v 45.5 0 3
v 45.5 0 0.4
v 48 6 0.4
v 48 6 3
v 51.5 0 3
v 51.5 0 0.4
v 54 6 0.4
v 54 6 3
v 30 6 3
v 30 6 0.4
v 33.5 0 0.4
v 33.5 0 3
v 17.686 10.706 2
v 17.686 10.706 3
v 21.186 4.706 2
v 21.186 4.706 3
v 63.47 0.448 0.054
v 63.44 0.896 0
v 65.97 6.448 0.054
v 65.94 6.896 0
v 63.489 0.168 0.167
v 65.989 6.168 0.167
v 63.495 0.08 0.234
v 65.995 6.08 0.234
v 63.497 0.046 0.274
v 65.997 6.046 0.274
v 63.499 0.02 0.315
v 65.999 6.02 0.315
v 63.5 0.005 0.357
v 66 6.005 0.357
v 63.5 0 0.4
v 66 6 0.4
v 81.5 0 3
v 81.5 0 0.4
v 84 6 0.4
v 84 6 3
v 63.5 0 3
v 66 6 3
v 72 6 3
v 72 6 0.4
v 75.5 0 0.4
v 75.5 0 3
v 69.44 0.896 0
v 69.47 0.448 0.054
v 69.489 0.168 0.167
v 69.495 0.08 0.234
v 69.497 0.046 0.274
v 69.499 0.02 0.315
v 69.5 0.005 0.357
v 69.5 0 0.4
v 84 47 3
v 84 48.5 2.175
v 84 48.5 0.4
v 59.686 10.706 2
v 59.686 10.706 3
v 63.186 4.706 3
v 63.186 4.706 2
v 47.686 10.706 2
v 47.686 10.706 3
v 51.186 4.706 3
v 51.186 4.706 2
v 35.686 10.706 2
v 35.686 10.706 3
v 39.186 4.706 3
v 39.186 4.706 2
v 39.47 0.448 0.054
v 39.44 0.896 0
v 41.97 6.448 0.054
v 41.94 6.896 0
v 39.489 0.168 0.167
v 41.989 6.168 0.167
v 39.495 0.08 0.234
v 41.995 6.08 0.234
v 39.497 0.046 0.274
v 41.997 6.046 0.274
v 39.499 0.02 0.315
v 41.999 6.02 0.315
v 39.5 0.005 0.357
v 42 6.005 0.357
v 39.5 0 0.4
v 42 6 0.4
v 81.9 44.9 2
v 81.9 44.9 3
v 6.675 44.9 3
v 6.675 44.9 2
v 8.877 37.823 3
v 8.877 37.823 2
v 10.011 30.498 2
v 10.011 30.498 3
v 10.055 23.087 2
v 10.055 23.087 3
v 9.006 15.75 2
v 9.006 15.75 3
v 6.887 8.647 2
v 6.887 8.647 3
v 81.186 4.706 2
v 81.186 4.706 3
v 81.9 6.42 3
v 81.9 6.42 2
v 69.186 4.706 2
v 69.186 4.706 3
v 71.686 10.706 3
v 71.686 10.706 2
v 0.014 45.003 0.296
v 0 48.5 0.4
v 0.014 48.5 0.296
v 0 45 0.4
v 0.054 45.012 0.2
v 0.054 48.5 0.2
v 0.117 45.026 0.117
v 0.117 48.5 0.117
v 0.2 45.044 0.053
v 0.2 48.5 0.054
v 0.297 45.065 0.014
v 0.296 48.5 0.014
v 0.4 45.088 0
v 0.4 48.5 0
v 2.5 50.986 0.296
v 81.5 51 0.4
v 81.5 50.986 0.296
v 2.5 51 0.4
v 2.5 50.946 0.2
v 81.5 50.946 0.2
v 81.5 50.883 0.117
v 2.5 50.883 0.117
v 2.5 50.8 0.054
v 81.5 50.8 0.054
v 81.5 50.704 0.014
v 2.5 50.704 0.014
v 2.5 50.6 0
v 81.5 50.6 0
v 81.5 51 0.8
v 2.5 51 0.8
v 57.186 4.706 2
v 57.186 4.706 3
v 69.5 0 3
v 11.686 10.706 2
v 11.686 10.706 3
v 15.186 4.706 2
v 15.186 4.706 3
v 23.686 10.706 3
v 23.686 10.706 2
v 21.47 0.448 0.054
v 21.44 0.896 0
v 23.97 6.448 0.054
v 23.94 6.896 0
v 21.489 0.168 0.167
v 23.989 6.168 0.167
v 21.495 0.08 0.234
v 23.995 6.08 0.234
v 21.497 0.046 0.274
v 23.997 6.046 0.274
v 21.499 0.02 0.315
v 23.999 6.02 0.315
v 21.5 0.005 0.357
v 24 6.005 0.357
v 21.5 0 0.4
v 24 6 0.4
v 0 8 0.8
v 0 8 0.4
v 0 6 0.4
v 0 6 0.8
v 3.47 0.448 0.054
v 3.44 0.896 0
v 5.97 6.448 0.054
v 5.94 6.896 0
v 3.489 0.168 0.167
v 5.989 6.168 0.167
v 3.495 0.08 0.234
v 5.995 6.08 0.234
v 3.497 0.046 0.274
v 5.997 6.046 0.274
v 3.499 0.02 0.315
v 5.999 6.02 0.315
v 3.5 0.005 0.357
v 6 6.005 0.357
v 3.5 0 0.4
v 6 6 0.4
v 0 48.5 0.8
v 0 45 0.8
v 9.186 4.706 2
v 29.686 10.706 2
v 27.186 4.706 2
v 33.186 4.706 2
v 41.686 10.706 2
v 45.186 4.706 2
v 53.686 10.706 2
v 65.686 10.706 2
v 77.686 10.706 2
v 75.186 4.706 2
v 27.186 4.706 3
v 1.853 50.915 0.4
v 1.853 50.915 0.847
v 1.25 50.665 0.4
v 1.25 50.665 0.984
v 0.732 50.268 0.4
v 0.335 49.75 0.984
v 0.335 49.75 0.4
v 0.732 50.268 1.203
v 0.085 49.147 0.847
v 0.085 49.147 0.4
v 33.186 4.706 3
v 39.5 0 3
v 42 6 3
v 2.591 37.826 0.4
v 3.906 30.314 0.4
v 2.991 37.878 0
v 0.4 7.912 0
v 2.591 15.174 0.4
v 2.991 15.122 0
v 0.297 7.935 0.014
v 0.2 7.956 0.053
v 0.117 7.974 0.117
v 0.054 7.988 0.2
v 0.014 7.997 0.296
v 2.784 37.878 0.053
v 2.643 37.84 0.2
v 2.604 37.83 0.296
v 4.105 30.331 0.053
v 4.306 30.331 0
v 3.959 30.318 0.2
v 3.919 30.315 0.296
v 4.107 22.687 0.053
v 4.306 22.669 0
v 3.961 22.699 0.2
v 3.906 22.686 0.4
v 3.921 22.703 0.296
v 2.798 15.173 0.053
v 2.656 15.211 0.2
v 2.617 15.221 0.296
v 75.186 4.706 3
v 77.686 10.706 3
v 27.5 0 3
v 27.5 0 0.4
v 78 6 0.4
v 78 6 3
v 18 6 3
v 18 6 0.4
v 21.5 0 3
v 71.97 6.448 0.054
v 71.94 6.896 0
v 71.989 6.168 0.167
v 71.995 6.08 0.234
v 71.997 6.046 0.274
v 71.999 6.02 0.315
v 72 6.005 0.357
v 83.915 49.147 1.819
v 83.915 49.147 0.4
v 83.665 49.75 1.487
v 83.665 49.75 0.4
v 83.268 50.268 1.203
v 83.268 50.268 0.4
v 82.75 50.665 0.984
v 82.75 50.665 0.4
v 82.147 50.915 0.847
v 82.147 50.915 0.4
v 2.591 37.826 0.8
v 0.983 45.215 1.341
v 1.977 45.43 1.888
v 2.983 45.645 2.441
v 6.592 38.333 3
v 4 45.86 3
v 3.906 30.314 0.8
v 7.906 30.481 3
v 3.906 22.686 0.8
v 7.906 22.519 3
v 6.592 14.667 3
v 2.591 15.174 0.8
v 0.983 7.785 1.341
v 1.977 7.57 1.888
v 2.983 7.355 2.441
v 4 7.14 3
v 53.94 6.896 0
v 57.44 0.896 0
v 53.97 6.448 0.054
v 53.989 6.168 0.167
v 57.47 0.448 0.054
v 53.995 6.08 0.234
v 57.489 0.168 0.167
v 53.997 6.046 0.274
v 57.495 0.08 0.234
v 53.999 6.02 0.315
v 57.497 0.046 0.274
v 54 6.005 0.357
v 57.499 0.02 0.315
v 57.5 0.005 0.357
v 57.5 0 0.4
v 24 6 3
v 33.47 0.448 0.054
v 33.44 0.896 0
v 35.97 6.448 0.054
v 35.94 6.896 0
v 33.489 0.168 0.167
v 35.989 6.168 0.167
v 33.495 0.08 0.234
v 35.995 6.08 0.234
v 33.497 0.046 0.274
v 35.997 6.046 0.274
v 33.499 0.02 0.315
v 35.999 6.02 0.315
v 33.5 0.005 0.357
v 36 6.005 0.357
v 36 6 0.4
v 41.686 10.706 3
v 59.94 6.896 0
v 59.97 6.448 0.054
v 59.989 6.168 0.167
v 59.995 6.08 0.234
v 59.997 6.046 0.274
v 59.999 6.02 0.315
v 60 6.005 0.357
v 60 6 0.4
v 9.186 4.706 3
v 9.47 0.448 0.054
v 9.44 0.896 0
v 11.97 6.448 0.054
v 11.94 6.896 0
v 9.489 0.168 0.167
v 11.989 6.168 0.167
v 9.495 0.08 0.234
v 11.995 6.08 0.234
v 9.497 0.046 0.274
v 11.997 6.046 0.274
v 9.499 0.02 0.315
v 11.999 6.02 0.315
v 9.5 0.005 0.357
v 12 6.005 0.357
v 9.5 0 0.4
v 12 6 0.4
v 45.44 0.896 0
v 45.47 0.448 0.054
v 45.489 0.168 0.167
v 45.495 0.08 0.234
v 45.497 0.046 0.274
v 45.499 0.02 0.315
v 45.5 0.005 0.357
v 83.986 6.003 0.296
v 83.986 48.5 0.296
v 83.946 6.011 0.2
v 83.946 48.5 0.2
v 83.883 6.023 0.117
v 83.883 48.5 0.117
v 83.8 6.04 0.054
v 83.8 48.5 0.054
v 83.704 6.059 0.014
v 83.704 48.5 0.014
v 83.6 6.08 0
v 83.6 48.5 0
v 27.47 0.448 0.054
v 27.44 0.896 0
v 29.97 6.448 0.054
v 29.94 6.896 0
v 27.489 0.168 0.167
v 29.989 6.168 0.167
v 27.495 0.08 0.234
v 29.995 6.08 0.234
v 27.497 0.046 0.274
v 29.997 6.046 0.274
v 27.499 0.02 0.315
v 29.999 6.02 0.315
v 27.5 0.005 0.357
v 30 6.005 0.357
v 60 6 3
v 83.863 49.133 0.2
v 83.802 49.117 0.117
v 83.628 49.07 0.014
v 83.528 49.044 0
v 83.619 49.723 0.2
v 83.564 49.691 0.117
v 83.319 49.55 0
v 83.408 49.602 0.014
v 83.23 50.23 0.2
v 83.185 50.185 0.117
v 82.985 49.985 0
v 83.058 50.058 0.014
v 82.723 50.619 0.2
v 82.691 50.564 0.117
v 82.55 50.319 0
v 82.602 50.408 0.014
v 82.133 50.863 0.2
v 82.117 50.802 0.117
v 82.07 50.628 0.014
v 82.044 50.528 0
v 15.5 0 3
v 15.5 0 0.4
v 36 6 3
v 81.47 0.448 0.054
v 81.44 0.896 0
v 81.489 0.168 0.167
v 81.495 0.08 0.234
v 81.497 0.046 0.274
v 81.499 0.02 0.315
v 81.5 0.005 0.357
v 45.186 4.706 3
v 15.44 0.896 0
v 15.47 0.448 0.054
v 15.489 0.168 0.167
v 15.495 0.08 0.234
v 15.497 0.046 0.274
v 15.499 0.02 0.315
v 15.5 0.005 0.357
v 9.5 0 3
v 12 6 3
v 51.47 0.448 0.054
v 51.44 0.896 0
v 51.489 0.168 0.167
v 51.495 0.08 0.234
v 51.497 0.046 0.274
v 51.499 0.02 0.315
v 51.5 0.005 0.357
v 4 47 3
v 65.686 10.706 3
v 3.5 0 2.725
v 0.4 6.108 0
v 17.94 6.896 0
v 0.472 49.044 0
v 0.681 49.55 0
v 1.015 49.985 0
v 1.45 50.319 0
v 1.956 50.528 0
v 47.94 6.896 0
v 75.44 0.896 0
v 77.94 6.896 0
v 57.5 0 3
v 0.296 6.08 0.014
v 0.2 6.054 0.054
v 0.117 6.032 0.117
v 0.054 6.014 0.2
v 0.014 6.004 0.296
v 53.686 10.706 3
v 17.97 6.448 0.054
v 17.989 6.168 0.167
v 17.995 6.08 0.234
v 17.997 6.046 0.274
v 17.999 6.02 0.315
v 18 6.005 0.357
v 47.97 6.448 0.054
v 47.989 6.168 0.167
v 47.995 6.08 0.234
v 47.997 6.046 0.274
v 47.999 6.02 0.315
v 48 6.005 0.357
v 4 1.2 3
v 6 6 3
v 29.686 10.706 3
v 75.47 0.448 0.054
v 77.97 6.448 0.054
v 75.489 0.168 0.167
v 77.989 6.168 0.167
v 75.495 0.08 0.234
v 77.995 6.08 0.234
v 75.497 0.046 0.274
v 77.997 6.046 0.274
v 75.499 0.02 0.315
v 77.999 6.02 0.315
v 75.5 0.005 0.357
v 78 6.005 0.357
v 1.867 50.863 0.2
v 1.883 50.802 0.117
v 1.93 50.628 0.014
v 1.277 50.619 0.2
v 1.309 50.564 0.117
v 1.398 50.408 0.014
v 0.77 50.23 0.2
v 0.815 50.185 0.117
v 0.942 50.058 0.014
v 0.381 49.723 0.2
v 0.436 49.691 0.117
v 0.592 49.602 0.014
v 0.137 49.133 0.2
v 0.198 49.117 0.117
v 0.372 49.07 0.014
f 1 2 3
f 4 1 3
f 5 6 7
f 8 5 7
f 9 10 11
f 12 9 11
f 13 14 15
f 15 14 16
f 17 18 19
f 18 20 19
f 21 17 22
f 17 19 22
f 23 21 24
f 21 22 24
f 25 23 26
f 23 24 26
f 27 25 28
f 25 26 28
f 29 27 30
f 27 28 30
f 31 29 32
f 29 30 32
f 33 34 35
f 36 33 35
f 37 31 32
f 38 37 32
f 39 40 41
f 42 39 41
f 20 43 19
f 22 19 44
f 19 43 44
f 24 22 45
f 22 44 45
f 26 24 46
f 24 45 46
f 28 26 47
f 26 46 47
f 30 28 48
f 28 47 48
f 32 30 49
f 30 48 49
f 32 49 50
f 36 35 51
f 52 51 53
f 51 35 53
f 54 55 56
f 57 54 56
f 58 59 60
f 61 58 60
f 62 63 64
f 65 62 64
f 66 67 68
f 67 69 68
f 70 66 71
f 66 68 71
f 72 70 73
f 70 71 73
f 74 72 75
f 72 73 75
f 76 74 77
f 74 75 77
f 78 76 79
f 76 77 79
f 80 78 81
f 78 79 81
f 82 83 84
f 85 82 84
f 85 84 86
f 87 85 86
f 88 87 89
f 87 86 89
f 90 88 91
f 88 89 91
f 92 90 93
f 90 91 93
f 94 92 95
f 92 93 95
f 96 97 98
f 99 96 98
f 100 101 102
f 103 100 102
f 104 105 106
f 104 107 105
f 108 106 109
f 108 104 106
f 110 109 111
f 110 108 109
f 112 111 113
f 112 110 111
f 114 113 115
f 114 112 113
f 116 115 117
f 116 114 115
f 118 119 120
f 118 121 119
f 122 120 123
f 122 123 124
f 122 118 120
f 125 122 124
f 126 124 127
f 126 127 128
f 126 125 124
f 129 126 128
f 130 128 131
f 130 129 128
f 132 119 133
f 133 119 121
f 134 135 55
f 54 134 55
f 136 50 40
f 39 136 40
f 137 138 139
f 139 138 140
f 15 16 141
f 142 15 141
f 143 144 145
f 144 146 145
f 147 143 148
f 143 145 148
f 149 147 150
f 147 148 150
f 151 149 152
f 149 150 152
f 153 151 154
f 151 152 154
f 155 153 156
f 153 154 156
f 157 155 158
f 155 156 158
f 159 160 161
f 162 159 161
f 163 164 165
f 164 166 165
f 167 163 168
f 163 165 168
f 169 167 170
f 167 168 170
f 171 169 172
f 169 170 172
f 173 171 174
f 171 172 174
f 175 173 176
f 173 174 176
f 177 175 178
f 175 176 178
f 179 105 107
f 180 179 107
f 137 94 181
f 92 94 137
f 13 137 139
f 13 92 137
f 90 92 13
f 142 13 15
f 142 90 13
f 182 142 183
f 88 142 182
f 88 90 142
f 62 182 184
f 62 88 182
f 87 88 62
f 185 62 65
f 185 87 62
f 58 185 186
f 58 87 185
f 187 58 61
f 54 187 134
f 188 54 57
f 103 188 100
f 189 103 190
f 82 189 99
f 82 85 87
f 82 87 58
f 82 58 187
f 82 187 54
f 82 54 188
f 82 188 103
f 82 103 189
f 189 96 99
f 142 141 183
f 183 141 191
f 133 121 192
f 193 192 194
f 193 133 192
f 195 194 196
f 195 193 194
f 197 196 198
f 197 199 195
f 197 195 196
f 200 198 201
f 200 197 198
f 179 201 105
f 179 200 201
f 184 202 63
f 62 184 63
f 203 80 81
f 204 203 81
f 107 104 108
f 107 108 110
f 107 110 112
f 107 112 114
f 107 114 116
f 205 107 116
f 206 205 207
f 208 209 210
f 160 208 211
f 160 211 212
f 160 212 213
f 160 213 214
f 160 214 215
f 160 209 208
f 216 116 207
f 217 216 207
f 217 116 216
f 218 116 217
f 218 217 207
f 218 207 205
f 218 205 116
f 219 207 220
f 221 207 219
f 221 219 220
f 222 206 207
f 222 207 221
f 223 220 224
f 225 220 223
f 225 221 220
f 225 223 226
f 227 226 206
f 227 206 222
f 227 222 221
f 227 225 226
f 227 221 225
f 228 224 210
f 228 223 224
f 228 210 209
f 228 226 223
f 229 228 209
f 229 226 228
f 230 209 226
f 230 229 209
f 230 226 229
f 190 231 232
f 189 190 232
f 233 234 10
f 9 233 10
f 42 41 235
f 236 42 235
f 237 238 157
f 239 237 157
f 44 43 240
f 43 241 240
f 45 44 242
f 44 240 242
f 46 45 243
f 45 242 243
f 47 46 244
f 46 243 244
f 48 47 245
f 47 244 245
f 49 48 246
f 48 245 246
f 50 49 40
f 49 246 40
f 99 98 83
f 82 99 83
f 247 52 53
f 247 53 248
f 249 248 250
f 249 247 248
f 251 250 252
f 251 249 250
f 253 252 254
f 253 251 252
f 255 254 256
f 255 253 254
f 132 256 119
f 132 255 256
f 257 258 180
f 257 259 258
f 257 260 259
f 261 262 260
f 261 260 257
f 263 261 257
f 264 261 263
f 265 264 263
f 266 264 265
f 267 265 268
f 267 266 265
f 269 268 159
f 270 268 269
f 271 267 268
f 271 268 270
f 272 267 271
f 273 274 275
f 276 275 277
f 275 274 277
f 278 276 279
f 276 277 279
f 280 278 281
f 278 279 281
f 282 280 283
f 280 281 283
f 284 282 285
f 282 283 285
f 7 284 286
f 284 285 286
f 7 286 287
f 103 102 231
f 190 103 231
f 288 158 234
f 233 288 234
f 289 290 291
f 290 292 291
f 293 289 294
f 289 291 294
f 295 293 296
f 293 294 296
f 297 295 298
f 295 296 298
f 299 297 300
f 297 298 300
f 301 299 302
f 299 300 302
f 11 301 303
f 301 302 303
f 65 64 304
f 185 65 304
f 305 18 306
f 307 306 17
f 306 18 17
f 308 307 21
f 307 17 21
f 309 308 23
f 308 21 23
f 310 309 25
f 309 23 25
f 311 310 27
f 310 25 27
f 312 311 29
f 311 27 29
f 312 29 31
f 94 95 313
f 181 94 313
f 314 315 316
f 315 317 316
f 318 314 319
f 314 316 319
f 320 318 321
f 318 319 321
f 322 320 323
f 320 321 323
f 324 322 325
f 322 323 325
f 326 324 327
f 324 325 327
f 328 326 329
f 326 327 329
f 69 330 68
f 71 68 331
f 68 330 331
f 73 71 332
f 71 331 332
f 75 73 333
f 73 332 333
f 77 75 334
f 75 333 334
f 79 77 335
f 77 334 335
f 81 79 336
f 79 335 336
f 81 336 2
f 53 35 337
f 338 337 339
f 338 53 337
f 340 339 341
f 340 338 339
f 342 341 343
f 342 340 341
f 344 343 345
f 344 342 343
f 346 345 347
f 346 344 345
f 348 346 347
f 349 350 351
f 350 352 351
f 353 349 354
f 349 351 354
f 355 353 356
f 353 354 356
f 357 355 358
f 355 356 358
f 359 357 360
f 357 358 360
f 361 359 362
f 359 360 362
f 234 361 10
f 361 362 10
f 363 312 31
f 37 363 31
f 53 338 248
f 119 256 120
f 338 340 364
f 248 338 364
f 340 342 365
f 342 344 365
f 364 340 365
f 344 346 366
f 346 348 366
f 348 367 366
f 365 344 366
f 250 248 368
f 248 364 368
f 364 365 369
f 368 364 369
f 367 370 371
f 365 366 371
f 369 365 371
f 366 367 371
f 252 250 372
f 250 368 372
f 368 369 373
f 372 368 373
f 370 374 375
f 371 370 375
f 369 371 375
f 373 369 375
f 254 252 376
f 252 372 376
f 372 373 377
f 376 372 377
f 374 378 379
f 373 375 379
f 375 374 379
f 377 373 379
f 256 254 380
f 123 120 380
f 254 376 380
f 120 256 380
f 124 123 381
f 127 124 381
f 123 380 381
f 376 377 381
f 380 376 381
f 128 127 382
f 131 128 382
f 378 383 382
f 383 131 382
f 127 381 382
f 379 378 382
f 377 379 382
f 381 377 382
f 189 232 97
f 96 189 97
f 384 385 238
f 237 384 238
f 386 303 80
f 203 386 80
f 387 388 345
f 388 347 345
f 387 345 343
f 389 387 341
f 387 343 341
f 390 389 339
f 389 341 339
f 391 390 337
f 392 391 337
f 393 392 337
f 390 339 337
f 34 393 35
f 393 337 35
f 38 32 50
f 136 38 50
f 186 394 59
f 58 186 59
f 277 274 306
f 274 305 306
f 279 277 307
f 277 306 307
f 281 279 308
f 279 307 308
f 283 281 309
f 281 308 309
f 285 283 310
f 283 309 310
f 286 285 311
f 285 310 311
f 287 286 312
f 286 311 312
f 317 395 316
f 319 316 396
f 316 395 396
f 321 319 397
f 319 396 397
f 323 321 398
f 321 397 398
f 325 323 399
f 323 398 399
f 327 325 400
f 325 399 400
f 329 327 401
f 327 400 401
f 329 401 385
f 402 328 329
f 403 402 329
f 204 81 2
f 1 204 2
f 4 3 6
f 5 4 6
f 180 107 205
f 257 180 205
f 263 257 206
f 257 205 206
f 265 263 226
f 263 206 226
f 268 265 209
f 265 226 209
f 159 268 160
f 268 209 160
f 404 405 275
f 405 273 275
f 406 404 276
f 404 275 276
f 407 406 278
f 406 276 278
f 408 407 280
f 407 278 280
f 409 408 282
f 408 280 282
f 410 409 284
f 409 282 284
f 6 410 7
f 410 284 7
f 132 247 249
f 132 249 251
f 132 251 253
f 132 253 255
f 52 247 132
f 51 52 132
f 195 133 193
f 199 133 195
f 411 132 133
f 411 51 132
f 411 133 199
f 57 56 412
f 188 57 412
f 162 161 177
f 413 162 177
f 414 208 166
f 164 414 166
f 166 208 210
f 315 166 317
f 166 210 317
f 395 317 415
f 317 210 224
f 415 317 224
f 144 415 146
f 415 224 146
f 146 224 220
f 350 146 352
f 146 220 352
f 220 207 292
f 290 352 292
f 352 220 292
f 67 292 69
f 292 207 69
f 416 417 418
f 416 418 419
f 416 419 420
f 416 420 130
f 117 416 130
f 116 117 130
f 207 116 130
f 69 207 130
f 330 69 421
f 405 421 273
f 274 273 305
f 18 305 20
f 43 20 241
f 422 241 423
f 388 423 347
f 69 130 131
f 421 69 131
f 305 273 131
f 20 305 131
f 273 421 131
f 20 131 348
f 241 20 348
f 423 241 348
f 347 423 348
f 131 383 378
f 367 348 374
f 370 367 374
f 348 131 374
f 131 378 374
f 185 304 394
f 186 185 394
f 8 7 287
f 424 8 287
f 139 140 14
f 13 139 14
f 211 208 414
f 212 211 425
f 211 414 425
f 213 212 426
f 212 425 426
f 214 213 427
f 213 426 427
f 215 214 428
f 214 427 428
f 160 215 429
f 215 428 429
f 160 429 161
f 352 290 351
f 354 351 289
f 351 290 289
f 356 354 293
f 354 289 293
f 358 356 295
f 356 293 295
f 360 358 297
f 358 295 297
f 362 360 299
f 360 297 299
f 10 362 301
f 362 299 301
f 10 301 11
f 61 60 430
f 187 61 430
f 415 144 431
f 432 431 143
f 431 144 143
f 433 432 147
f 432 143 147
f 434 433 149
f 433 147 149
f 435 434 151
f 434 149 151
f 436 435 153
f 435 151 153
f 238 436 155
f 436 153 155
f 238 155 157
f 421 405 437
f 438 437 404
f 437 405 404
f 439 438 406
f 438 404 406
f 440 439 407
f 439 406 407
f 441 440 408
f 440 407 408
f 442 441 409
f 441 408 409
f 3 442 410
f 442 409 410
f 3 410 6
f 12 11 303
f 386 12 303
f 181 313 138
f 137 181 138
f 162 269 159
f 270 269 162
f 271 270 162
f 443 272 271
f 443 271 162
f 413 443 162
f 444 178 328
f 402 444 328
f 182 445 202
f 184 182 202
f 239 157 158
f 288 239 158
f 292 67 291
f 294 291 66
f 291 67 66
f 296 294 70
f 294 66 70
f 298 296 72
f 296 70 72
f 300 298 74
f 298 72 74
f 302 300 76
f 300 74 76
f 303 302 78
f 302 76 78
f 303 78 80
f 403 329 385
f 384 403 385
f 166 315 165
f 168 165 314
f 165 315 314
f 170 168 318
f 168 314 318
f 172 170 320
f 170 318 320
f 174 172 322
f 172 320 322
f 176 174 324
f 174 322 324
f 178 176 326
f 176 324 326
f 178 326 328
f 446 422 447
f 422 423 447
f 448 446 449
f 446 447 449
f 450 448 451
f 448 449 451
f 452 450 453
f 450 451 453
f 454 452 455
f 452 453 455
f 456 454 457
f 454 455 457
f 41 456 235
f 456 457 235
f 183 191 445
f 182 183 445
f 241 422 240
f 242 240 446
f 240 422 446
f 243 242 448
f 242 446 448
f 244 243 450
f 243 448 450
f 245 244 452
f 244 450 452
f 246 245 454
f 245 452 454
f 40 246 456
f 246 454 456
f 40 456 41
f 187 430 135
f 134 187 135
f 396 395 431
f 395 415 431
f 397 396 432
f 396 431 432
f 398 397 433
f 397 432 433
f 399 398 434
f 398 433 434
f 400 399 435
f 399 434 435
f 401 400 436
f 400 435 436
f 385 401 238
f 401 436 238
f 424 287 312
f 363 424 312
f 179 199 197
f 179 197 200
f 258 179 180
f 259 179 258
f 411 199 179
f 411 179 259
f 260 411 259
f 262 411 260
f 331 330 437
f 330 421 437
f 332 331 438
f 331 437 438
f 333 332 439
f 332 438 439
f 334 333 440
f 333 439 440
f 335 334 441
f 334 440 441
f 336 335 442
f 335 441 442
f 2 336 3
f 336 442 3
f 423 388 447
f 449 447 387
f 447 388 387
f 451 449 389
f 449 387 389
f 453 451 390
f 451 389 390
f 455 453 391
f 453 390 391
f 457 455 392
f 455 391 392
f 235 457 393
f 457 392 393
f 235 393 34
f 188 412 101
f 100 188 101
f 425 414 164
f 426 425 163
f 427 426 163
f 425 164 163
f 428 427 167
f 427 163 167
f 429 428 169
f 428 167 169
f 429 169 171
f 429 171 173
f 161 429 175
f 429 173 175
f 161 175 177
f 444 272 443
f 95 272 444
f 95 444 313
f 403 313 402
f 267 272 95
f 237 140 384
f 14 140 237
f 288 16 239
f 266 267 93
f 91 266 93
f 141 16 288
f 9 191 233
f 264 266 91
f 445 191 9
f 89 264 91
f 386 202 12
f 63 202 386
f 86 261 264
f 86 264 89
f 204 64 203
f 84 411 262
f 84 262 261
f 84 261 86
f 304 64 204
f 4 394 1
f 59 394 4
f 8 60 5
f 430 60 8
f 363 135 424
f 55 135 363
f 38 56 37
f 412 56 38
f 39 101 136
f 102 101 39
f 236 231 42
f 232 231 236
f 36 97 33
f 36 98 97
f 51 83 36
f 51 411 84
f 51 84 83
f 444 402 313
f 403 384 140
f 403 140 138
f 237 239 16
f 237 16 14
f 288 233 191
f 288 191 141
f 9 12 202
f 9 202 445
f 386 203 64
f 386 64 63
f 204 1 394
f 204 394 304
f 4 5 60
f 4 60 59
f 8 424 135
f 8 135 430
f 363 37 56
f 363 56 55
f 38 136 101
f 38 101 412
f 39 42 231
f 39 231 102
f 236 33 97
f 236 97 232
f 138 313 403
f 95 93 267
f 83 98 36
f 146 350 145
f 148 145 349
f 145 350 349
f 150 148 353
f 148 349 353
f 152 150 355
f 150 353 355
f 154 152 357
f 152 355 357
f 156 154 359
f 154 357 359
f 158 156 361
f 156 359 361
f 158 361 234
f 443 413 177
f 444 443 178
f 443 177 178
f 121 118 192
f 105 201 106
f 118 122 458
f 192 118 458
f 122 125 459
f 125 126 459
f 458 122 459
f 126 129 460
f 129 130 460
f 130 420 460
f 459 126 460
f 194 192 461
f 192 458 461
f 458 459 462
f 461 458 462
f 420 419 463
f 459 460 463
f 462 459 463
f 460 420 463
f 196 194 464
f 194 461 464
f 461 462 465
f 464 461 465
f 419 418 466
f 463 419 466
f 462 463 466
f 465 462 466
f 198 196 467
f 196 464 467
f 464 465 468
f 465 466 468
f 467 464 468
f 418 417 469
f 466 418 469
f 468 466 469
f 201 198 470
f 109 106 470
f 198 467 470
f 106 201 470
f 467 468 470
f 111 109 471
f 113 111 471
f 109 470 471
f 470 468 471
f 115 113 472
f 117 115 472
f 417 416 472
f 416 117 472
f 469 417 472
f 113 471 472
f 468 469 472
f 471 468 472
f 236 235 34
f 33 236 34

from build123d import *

# Parameters (mm, degrees)
F1_DEPTH = 3
F2_SIZE2 = 4
F2_SIZE  = 2.2
F3_R     = 2.5
F5_DEPTH = 1
F6_R     = 0.4


with BuildPart() as f1:
    # F0 (on Top) → F1 (new body)
    with BuildSketch(Plane.XY):
        with BuildLine():
            Line((84, 6), (84, 51))
            Line((84, 51), (0, 51))
            Line((0, 51), (0, 45))
            ThreePointArc((0, 45), (4.070965, 26.5), (0, 8))
            Line((0, 8), (0, 6))
            Line((0, 6), (3.5, 0))
            Line((3.5, 0), (6, 6))
            Line((6, 6), (9.5, 0))
            Line((9.5, 0), (12, 6))
            Line((12, 6), (15.5, 0))
            Line((15.5, 0), (18, 6))
            Line((18, 6), (21.5, 0))
            Line((21.5, 0), (24, 6))
            Line((24, 6), (27.5, 0))
            Line((27.5, 0), (30, 6))
            Line((30, 6), (33.5, 0))
            Line((33.5, 0), (36, 6))
            Line((36, 6), (39.5, 0))
            Line((39.5, 0), (42, 6))
            Line((42, 6), (45.5, 0))
            Line((45.5, 0), (48, 6))
            Line((48, 6), (51.5, 0))
            Line((51.5, 0), (54, 6))
            Line((54, 6), (57.5, 0))
            Line((57.5, 0), (60, 6))
            Line((60, 6), (63.5, 0))
            Line((63.5, 0), (66, 6))
            Line((66, 6), (69.5, 0))
            Line((69.5, 0), (72, 6))
            Line((72, 6), (75.5, 0))
            Line((75.5, 0), (78, 6))
            Line((78, 6), (81.5, 0))
            Line((81.5, 0), (84, 6))
        make_face()
    extrude(amount=F1_DEPTH)

    # F2
    f2_edges = [f1.edges().sort_by_distance(p)[0] for p in [
        (0, 7, 3),
        (4.070965, 26.5, 3),
        (42, 51, 3),
        (0, 48, 3),
    ]]
    chamfer(f2_edges, length=F2_SIZE, length2=F2_SIZE2)

    # F3
    f3_edges = [f1.edges().sort_by_distance(p)[0] for p in [
        (0, 51, 0.4),
        (84, 51, 0.4),
    ]]
    fillet(f3_edges, radius=F3_R)

    # F4 (on face) → F5 (cut)
    with BuildSketch(Plane.XY.offset(3)):
        with BuildLine():
            Line((81.185907, 4.706178), (81.9, 6.42))
            Line((81.9, 6.42), (81.9, 44.9))
            Line((81.9, 44.9), (6.675109, 44.9))
            ThreePointArc((6.675109, 44.9), (10.170108, 26.793334), (6.887072, 8.647038))
            Line((6.887072, 8.647038), (9.185907, 4.706178))
            Line((9.185907, 4.706178), (11.685907, 10.706178))
            Line((11.685907, 10.706178), (15.185907, 4.706178))
            Line((15.185907, 4.706178), (17.685907, 10.706178))
            Line((17.685907, 10.706178), (21.185907, 4.706178))
            Line((21.185907, 4.706178), (23.685907, 10.706178))
            Line((23.685907, 10.706178), (27.185907, 4.706178))
            Line((27.185907, 4.706178), (29.685907, 10.706178))
            Line((29.685907, 10.706178), (33.185907, 4.706178))
            Line((33.185907, 4.706178), (35.685907, 10.706178))
            Line((35.685907, 10.706178), (39.185907, 4.706178))
            Line((39.185907, 4.706178), (41.685907, 10.706178))
            Line((41.685907, 10.706178), (45.185907, 4.706178))
            Line((45.185907, 4.706178), (47.685907, 10.706178))
            Line((47.685907, 10.706178), (51.185907, 4.706178))
            Line((51.185907, 4.706178), (53.685907, 10.706178))
            Line((53.685907, 10.706178), (57.185907, 4.706178))
            Line((57.185907, 4.706178), (59.685907, 10.706178))
            Line((59.685907, 10.706178), (63.185907, 4.706178))
            Line((63.185907, 4.706178), (65.685907, 10.706178))
            Line((65.685907, 10.706178), (69.185907, 4.706178))
            Line((69.185907, 4.706178), (71.685907, 10.706178))
            Line((71.685907, 10.706178), (75.185907, 4.706178))
            Line((75.185907, 4.706178), (77.685907, 10.706178))
            Line((77.685907, 10.706178), (81.185907, 4.706178))
        make_face()
    extrude(amount=-F5_DEPTH, mode=Mode.SUBTRACT)

    # F6
    f6_edges = [f1.edges().sort_by_distance(p)[0] for p in [
        (84, 27.25, 0),
        (83.267767, 50.267767, 0),
        (82.75, 3, 0),
        (42, 51, 0),
        (79.75, 3, 0),
        (0.732233, 50.267767, 0),
        (76.75, 3, 0),
        (0, 46.75, 0),
        (73.75, 3, 0),
        (4.070965, 26.5, 0),
        (70.75, 3, 0),
        (0, 7, 0),
        (67.75, 3, 0),
        (1.75, 3, 0),
        (64.75, 3, 0),
        (4.75, 3, 0),
        (61.75, 3, 0),
        (7.75, 3, 0),
        (58.75, 3, 0),
        (10.75, 3, 0),
        (55.75, 3, 0),
        (13.75, 3, 0),
        (52.75, 3, 0),
        (16.75, 3, 0),
        (49.75, 3, 0),
        (19.75, 3, 0),
        (46.75, 3, 0),
        (22.75, 3, 0),
        (43.75, 3, 0),
        (25.75, 3, 0),
        (40.75, 3, 0),
        (28.75, 3, 0),
        (37.75, 3, 0),
        (31.75, 3, 0),
        (34.75, 3, 0),
    ]]
    fillet(f6_edges, radius=F6_R)


solid = f1.part
